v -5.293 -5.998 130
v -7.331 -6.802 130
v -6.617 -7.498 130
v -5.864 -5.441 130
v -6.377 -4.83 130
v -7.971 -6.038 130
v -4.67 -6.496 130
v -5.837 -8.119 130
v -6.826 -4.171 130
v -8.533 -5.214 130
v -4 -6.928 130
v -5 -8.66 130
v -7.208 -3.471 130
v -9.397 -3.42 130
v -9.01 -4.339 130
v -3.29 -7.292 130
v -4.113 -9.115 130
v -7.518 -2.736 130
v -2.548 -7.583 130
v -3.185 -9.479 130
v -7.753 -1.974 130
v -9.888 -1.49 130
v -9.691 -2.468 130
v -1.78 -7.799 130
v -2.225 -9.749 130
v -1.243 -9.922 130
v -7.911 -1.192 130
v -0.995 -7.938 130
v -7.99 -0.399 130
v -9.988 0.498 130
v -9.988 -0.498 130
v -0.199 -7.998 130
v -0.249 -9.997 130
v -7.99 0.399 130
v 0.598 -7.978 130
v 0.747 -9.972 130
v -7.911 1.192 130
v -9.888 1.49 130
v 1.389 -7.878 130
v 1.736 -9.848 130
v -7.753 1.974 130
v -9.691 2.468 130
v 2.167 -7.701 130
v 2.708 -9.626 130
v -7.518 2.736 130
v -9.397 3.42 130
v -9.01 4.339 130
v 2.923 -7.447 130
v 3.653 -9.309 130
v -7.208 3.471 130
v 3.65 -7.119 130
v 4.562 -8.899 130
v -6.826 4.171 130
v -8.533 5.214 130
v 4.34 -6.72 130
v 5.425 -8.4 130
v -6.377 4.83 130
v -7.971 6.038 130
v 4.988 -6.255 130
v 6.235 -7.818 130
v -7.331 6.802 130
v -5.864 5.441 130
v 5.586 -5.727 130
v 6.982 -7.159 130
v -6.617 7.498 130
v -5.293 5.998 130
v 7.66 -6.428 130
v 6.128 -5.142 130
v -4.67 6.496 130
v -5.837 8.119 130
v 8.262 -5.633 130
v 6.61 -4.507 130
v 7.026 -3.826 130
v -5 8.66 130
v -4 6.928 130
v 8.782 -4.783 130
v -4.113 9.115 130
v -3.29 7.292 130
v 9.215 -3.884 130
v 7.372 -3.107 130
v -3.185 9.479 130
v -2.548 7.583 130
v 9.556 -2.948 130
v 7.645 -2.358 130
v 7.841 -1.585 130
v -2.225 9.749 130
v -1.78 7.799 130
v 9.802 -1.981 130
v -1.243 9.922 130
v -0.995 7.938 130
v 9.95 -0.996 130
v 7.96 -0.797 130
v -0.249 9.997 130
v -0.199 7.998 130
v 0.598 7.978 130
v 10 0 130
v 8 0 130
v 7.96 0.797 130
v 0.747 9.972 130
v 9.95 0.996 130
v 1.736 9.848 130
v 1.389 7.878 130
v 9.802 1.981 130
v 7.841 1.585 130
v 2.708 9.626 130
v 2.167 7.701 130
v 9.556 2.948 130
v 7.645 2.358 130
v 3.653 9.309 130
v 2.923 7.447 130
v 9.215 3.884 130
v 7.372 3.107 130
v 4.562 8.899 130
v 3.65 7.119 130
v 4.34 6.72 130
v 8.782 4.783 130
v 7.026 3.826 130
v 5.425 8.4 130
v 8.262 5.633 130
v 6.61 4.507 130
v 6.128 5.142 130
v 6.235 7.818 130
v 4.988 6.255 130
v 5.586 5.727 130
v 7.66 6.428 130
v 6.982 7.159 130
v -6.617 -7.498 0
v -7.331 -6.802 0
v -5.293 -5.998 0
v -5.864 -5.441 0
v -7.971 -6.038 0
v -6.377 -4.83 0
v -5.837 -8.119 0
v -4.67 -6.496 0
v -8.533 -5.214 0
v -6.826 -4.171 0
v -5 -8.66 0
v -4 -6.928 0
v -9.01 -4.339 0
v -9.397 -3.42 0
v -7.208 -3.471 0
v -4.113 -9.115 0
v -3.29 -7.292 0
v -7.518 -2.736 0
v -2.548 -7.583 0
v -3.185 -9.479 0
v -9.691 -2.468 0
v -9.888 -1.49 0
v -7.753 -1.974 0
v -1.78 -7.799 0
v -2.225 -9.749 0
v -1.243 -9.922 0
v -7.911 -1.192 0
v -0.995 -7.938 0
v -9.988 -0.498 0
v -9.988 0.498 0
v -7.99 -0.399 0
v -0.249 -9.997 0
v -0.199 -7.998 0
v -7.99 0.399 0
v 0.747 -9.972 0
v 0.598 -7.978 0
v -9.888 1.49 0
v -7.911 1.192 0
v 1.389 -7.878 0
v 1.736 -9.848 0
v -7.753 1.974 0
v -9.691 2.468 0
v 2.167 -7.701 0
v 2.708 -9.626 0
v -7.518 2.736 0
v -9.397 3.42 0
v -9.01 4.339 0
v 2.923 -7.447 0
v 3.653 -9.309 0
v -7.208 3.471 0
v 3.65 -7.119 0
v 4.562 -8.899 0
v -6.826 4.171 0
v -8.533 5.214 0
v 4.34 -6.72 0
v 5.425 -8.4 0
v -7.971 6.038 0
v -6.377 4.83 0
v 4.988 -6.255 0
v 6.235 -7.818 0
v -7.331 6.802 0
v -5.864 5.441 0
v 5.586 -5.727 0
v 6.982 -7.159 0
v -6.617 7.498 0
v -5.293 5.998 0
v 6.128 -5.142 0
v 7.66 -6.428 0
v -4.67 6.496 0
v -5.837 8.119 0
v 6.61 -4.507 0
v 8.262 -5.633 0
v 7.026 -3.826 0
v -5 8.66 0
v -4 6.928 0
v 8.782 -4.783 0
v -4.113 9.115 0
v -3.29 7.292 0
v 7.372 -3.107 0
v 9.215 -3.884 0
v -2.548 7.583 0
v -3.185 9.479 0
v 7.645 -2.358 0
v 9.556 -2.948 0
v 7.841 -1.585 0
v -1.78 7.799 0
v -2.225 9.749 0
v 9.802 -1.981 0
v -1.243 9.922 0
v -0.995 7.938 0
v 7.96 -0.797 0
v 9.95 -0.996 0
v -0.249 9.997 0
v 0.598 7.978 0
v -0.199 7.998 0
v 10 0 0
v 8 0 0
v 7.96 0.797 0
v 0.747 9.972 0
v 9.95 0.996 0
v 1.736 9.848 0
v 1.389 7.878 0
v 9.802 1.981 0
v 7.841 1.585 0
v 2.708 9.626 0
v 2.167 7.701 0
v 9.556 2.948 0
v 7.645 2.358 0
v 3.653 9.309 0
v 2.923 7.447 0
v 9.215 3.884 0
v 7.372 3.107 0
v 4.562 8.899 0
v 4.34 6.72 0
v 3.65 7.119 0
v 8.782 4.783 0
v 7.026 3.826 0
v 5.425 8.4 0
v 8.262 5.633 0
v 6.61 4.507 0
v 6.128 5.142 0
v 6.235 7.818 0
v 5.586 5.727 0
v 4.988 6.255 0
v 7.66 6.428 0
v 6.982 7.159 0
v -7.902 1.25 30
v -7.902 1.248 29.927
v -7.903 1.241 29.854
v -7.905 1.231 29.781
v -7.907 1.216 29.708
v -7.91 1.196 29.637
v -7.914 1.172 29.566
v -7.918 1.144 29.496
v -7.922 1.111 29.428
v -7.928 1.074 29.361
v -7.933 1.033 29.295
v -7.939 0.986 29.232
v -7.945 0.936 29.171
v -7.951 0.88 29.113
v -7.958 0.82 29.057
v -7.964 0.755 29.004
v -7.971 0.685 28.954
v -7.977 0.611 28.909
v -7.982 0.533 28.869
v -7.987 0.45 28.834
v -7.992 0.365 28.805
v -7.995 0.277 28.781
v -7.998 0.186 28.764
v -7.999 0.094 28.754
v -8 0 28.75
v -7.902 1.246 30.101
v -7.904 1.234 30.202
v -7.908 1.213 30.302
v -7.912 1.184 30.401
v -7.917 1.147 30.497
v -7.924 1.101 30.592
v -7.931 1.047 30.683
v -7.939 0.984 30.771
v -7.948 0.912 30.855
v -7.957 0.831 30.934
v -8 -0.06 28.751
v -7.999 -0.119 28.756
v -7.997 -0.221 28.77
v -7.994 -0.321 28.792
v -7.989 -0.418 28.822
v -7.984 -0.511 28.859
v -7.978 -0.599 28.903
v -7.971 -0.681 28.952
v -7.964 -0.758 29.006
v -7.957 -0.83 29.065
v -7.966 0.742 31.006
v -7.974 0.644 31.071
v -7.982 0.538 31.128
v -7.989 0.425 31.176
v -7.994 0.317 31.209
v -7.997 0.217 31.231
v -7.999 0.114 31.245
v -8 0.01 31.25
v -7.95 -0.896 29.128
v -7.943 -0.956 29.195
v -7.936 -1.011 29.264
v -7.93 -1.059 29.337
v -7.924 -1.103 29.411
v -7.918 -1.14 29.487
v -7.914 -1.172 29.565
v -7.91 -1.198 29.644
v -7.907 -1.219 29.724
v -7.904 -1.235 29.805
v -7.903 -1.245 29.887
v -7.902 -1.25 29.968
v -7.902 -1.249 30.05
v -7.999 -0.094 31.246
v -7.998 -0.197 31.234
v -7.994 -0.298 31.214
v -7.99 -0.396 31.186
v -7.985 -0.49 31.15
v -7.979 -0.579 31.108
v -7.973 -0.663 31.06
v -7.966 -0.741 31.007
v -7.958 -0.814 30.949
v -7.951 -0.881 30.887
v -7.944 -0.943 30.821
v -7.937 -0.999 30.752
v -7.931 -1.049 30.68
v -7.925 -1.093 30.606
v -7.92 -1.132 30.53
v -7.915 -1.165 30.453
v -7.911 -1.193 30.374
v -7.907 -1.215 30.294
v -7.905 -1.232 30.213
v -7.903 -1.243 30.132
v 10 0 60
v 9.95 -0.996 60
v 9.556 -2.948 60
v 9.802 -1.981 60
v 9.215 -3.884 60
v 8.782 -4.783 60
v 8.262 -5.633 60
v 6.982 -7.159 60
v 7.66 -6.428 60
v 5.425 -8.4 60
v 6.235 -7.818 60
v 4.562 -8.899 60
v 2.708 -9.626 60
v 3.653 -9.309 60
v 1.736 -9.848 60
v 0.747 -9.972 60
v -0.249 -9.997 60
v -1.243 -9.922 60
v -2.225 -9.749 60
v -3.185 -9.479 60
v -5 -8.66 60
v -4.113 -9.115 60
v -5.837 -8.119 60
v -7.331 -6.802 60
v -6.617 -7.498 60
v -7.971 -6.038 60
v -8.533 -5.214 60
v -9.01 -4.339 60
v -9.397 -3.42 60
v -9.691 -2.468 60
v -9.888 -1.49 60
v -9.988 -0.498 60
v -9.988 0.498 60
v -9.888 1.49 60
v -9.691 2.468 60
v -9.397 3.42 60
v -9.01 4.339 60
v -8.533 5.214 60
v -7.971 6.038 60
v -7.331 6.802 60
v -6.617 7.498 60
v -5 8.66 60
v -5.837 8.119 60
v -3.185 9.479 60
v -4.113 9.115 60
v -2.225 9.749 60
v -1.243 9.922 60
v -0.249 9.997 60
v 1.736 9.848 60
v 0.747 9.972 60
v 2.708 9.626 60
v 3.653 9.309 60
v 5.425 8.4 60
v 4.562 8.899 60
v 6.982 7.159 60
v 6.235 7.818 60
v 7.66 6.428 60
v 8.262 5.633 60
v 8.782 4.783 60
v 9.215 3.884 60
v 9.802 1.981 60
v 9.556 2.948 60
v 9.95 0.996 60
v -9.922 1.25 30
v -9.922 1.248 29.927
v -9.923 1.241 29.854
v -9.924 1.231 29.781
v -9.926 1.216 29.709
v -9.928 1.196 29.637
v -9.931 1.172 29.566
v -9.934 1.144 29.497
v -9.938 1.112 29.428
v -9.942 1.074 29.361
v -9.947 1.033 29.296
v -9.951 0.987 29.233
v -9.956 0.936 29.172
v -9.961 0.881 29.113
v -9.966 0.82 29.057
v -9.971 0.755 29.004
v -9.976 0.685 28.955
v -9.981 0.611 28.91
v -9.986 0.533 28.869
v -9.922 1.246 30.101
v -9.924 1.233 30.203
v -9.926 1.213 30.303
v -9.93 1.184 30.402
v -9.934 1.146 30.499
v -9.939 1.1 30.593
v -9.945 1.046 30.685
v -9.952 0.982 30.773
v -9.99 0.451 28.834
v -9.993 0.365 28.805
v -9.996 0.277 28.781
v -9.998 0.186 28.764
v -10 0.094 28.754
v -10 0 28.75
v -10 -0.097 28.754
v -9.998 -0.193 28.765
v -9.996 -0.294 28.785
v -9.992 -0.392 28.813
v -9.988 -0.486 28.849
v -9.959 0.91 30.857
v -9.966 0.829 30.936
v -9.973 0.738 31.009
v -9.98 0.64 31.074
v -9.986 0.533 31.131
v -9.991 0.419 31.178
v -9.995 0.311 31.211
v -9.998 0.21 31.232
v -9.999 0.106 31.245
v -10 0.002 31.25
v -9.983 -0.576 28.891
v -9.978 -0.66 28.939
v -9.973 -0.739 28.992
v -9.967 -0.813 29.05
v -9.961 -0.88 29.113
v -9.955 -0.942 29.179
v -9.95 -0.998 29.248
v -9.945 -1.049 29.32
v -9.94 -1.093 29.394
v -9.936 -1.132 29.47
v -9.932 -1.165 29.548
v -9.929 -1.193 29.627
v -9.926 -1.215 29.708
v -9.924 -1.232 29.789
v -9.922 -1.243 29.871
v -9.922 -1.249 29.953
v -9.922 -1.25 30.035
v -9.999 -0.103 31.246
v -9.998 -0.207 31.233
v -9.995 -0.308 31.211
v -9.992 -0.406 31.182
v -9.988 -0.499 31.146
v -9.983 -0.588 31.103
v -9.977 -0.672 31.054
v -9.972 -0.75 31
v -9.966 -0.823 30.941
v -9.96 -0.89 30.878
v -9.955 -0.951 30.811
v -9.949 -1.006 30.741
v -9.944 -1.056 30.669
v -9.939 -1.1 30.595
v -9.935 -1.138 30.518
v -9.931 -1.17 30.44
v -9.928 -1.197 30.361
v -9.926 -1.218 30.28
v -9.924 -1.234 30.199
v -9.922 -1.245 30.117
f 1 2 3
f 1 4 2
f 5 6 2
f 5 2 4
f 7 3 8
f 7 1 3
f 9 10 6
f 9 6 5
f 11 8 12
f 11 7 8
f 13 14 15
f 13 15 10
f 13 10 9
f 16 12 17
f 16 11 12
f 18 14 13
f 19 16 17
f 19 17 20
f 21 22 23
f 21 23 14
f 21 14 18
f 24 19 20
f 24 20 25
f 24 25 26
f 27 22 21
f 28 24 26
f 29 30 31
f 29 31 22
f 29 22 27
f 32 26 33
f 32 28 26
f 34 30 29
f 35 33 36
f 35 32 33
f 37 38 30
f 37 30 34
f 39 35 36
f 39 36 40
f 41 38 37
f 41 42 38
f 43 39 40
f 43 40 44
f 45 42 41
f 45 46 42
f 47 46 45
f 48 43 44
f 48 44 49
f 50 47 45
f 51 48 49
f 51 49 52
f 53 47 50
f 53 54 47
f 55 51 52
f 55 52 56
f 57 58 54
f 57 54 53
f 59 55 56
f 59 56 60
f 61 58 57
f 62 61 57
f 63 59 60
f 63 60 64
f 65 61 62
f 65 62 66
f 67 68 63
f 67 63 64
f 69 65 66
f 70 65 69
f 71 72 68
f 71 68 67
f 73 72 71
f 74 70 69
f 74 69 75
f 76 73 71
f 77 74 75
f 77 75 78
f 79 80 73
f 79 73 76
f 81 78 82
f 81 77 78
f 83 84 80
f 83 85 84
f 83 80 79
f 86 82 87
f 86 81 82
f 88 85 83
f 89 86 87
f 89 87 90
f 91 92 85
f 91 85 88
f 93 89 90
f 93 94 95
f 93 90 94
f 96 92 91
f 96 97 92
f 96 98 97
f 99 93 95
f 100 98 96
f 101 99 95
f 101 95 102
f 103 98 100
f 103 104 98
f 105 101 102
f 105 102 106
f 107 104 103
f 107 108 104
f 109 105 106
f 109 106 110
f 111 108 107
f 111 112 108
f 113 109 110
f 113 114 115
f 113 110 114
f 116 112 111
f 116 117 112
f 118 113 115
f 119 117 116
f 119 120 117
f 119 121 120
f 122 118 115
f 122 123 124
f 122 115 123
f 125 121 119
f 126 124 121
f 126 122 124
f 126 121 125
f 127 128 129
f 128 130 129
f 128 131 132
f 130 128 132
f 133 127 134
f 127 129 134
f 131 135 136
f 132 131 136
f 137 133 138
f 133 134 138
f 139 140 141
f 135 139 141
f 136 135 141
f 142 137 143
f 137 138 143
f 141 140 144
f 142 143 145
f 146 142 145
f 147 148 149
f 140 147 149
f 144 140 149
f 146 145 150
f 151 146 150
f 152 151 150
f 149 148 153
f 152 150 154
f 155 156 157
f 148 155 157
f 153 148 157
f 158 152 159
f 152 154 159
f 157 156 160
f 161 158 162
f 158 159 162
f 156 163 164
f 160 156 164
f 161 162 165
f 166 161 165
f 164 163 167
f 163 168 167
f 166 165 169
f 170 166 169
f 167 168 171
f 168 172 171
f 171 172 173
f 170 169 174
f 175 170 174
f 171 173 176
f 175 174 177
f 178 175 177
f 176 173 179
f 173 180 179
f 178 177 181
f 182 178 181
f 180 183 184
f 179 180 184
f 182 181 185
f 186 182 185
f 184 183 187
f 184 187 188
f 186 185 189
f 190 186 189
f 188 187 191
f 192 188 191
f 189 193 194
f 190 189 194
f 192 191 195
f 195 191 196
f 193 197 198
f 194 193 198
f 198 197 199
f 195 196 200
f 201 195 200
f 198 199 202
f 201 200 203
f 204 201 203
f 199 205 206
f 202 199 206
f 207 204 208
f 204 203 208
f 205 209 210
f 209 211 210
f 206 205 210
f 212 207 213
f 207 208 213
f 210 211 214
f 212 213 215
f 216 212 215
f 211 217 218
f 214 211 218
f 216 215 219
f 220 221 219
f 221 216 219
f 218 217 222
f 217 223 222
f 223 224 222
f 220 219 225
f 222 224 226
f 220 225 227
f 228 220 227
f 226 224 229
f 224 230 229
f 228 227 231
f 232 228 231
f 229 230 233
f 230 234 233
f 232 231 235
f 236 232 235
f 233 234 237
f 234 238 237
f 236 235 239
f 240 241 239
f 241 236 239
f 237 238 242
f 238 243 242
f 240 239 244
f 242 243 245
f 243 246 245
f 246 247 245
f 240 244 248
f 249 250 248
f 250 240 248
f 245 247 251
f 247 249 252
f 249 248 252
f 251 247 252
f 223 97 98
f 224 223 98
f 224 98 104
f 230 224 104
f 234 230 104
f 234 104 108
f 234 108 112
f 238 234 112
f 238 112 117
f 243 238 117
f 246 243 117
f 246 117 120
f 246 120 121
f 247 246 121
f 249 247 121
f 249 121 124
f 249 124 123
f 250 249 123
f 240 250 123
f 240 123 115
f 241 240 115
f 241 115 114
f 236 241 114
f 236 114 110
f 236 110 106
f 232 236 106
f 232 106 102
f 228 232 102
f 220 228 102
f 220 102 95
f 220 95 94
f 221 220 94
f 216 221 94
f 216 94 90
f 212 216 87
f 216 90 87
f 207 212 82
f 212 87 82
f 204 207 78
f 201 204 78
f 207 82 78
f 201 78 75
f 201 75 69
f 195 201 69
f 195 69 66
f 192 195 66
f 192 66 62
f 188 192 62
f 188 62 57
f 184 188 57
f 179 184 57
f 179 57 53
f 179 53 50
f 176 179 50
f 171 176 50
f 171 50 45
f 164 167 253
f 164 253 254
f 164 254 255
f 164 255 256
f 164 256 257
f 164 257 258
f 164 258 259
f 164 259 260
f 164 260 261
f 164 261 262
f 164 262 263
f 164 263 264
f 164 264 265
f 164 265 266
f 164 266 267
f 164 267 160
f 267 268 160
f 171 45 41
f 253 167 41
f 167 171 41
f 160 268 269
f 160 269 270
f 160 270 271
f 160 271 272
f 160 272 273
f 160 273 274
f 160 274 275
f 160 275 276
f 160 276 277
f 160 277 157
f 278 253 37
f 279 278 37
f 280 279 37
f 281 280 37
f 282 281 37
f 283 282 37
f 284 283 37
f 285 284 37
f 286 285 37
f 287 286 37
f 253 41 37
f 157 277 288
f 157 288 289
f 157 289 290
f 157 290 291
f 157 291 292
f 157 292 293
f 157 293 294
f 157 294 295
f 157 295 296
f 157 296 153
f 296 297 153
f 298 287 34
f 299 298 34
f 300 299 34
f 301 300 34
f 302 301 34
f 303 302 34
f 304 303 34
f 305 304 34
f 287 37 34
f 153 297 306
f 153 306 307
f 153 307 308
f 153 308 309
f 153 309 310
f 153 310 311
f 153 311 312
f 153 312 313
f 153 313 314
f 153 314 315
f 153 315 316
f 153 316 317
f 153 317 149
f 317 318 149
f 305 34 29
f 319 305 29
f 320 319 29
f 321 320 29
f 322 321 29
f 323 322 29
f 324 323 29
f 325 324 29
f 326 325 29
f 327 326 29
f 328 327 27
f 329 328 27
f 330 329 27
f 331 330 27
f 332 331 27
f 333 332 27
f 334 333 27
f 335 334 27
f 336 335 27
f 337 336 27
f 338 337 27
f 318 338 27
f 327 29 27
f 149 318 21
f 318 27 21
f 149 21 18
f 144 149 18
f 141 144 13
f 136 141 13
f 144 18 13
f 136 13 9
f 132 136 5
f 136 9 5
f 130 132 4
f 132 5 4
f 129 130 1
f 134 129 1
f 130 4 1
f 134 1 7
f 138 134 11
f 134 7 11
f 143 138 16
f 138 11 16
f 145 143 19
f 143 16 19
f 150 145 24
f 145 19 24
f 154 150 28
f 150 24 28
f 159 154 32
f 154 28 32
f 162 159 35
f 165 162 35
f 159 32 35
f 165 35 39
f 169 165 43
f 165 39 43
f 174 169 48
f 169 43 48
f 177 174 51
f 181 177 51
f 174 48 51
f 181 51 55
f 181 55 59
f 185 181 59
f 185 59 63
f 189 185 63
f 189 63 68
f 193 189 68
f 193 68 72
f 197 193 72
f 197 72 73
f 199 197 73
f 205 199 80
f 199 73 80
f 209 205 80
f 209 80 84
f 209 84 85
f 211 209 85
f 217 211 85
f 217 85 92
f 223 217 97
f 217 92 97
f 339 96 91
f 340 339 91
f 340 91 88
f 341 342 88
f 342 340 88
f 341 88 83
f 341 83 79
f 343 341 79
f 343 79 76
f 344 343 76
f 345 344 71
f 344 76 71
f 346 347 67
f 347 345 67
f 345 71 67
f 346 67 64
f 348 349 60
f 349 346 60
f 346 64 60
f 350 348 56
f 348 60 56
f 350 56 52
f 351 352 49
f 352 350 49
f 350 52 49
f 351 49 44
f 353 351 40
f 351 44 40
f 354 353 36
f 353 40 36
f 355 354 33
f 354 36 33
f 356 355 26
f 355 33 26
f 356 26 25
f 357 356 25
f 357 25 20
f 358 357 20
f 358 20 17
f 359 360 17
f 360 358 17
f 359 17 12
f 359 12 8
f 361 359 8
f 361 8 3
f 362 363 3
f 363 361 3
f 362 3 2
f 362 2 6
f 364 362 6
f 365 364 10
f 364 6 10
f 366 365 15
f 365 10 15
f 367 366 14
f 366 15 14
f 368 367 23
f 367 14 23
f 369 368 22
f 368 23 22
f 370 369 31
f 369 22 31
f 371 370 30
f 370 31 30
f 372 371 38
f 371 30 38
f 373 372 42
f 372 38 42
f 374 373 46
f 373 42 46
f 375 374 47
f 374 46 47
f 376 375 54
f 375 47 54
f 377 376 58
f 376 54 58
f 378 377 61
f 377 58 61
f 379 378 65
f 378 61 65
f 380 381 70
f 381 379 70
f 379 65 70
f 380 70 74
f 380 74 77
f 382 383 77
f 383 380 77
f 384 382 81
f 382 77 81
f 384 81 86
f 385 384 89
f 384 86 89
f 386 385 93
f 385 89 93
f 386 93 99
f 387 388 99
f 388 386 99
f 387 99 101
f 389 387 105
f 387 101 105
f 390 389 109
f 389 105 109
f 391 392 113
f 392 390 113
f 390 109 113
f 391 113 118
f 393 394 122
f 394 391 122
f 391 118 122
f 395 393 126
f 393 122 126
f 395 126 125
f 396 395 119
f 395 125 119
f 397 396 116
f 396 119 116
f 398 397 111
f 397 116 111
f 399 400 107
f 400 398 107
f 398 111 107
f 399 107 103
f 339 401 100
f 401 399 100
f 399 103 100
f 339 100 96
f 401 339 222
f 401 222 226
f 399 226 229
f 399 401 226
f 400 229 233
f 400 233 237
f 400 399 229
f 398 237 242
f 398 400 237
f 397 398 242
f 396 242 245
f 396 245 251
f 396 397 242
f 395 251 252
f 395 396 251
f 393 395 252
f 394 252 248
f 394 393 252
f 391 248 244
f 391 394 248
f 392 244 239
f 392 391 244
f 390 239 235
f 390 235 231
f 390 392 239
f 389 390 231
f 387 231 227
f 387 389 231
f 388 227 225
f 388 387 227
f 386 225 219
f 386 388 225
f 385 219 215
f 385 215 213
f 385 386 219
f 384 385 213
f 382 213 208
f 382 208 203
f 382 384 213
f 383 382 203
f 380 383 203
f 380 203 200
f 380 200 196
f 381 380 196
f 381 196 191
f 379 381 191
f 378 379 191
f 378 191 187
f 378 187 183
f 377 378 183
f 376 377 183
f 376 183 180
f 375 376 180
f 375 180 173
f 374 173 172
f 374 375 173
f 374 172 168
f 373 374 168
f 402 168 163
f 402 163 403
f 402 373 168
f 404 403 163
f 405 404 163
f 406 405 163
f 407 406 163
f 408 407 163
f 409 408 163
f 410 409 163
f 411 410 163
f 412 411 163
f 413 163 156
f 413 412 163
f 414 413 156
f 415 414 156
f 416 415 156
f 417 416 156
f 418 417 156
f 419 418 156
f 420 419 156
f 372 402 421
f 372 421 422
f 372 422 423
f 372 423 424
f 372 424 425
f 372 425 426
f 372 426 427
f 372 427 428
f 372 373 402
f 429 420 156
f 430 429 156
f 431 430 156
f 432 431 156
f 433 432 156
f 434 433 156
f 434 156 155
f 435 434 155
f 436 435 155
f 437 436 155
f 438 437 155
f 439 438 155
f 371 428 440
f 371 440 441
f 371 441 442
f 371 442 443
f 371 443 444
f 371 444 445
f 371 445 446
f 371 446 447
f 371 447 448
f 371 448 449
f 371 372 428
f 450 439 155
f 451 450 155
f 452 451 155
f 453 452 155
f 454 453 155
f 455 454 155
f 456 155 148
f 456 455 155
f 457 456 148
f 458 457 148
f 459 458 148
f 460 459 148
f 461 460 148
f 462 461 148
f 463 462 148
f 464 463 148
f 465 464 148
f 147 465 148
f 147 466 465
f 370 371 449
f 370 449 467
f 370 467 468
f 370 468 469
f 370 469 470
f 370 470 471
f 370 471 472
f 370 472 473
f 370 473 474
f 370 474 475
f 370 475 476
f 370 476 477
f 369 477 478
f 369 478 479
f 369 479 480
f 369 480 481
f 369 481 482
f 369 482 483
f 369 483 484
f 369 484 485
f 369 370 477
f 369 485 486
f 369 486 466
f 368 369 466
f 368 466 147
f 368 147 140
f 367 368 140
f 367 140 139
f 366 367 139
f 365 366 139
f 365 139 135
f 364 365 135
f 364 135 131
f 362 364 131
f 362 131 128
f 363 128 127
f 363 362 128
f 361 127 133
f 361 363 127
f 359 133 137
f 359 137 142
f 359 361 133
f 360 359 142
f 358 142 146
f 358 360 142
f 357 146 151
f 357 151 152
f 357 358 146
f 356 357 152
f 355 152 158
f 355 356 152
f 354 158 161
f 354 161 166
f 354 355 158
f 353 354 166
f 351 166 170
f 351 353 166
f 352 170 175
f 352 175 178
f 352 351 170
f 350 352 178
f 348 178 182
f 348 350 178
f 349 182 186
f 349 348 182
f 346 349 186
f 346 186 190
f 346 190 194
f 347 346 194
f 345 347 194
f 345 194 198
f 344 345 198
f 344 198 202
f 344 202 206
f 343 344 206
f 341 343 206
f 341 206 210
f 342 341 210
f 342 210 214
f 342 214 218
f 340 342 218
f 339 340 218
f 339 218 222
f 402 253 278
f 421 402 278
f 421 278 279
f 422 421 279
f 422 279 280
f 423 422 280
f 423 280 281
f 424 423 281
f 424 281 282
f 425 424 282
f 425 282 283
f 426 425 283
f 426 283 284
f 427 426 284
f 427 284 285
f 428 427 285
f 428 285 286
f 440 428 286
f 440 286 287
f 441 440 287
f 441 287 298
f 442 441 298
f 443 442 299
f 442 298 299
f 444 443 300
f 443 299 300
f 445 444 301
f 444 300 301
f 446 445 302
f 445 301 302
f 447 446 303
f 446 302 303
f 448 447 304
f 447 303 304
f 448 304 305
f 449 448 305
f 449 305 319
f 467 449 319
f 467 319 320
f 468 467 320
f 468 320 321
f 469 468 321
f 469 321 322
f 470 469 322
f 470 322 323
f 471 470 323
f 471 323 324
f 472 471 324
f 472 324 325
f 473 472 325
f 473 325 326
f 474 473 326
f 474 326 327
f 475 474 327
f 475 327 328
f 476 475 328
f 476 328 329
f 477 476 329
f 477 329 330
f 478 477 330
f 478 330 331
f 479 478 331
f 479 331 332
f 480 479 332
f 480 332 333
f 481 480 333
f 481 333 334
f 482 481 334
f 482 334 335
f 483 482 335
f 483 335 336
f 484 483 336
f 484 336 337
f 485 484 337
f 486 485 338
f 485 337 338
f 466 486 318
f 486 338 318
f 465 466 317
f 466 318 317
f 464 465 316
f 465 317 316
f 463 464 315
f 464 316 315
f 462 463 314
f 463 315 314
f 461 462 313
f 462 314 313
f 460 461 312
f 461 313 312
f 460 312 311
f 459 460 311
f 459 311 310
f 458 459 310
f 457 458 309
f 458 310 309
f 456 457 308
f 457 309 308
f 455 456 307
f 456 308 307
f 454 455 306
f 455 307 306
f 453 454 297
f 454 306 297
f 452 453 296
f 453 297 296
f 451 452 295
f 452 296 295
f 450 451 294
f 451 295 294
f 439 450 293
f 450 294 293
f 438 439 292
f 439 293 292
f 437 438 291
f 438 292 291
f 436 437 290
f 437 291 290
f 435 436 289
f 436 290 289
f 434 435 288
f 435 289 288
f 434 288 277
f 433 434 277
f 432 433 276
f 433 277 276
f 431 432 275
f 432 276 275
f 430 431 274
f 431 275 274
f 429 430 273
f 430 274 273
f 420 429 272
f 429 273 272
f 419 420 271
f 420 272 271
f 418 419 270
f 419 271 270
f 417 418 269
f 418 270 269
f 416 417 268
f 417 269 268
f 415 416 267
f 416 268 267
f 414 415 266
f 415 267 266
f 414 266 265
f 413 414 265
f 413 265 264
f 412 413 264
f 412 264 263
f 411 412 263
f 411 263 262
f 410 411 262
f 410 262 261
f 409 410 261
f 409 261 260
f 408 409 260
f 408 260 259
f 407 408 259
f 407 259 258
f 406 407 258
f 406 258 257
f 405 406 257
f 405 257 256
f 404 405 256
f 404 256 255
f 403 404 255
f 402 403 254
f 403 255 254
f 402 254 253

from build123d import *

# Parameters (mm, degrees)
F0_R      = 10
F2_R      = 10
F3_FACE_R = 10
F5_R      = 10
F7_R      = 8
F8_DEPTH  = 130.001
F10_DEPTH = 10.001


with BuildPart() as f3:
    # F0 (on Top) → F3 section 0
    with BuildSketch(Plane.XY):
        Circle(F0_R)
    # F2 (on offset) → F3 section 1
    with BuildSketch(Plane.XY.offset(60)):
        Circle(F2_R)
    loft()

    # F3_face (on face) → F6 section 0
    with BuildSketch(Plane(origin=(0, 0, 0), x_dir=(1, 0, 0), z_dir=(0, 0, -1))):
        Circle(F3_FACE_R)
    # F5 (on offset) → F6 section 1
    with BuildSketch(Plane.XY.offset(130)):
        Circle(F5_R)
    loft()

    # F7 (on face) → F8 (cut, through all)
    with BuildSketch(Plane.XY.offset(130)):
        Circle(F7_R)
    extrude(amount=-F8_DEPTH, mode=Mode.SUBTRACT)

    # F9 (on Right) → F10 (cut, through all)
    with BuildSketch(Plane.YZ):
        with BuildLine():
            ThreePointArc((0, 28.75), (0.883883, 29.116117), (1.25, 30))
            ThreePointArc((1.25, 30), (-0.883883, 30.883883), (0, 28.75))
        make_face()
    extrude(amount=-F10_DEPTH, mode=Mode.SUBTRACT)


solid = f3.part
